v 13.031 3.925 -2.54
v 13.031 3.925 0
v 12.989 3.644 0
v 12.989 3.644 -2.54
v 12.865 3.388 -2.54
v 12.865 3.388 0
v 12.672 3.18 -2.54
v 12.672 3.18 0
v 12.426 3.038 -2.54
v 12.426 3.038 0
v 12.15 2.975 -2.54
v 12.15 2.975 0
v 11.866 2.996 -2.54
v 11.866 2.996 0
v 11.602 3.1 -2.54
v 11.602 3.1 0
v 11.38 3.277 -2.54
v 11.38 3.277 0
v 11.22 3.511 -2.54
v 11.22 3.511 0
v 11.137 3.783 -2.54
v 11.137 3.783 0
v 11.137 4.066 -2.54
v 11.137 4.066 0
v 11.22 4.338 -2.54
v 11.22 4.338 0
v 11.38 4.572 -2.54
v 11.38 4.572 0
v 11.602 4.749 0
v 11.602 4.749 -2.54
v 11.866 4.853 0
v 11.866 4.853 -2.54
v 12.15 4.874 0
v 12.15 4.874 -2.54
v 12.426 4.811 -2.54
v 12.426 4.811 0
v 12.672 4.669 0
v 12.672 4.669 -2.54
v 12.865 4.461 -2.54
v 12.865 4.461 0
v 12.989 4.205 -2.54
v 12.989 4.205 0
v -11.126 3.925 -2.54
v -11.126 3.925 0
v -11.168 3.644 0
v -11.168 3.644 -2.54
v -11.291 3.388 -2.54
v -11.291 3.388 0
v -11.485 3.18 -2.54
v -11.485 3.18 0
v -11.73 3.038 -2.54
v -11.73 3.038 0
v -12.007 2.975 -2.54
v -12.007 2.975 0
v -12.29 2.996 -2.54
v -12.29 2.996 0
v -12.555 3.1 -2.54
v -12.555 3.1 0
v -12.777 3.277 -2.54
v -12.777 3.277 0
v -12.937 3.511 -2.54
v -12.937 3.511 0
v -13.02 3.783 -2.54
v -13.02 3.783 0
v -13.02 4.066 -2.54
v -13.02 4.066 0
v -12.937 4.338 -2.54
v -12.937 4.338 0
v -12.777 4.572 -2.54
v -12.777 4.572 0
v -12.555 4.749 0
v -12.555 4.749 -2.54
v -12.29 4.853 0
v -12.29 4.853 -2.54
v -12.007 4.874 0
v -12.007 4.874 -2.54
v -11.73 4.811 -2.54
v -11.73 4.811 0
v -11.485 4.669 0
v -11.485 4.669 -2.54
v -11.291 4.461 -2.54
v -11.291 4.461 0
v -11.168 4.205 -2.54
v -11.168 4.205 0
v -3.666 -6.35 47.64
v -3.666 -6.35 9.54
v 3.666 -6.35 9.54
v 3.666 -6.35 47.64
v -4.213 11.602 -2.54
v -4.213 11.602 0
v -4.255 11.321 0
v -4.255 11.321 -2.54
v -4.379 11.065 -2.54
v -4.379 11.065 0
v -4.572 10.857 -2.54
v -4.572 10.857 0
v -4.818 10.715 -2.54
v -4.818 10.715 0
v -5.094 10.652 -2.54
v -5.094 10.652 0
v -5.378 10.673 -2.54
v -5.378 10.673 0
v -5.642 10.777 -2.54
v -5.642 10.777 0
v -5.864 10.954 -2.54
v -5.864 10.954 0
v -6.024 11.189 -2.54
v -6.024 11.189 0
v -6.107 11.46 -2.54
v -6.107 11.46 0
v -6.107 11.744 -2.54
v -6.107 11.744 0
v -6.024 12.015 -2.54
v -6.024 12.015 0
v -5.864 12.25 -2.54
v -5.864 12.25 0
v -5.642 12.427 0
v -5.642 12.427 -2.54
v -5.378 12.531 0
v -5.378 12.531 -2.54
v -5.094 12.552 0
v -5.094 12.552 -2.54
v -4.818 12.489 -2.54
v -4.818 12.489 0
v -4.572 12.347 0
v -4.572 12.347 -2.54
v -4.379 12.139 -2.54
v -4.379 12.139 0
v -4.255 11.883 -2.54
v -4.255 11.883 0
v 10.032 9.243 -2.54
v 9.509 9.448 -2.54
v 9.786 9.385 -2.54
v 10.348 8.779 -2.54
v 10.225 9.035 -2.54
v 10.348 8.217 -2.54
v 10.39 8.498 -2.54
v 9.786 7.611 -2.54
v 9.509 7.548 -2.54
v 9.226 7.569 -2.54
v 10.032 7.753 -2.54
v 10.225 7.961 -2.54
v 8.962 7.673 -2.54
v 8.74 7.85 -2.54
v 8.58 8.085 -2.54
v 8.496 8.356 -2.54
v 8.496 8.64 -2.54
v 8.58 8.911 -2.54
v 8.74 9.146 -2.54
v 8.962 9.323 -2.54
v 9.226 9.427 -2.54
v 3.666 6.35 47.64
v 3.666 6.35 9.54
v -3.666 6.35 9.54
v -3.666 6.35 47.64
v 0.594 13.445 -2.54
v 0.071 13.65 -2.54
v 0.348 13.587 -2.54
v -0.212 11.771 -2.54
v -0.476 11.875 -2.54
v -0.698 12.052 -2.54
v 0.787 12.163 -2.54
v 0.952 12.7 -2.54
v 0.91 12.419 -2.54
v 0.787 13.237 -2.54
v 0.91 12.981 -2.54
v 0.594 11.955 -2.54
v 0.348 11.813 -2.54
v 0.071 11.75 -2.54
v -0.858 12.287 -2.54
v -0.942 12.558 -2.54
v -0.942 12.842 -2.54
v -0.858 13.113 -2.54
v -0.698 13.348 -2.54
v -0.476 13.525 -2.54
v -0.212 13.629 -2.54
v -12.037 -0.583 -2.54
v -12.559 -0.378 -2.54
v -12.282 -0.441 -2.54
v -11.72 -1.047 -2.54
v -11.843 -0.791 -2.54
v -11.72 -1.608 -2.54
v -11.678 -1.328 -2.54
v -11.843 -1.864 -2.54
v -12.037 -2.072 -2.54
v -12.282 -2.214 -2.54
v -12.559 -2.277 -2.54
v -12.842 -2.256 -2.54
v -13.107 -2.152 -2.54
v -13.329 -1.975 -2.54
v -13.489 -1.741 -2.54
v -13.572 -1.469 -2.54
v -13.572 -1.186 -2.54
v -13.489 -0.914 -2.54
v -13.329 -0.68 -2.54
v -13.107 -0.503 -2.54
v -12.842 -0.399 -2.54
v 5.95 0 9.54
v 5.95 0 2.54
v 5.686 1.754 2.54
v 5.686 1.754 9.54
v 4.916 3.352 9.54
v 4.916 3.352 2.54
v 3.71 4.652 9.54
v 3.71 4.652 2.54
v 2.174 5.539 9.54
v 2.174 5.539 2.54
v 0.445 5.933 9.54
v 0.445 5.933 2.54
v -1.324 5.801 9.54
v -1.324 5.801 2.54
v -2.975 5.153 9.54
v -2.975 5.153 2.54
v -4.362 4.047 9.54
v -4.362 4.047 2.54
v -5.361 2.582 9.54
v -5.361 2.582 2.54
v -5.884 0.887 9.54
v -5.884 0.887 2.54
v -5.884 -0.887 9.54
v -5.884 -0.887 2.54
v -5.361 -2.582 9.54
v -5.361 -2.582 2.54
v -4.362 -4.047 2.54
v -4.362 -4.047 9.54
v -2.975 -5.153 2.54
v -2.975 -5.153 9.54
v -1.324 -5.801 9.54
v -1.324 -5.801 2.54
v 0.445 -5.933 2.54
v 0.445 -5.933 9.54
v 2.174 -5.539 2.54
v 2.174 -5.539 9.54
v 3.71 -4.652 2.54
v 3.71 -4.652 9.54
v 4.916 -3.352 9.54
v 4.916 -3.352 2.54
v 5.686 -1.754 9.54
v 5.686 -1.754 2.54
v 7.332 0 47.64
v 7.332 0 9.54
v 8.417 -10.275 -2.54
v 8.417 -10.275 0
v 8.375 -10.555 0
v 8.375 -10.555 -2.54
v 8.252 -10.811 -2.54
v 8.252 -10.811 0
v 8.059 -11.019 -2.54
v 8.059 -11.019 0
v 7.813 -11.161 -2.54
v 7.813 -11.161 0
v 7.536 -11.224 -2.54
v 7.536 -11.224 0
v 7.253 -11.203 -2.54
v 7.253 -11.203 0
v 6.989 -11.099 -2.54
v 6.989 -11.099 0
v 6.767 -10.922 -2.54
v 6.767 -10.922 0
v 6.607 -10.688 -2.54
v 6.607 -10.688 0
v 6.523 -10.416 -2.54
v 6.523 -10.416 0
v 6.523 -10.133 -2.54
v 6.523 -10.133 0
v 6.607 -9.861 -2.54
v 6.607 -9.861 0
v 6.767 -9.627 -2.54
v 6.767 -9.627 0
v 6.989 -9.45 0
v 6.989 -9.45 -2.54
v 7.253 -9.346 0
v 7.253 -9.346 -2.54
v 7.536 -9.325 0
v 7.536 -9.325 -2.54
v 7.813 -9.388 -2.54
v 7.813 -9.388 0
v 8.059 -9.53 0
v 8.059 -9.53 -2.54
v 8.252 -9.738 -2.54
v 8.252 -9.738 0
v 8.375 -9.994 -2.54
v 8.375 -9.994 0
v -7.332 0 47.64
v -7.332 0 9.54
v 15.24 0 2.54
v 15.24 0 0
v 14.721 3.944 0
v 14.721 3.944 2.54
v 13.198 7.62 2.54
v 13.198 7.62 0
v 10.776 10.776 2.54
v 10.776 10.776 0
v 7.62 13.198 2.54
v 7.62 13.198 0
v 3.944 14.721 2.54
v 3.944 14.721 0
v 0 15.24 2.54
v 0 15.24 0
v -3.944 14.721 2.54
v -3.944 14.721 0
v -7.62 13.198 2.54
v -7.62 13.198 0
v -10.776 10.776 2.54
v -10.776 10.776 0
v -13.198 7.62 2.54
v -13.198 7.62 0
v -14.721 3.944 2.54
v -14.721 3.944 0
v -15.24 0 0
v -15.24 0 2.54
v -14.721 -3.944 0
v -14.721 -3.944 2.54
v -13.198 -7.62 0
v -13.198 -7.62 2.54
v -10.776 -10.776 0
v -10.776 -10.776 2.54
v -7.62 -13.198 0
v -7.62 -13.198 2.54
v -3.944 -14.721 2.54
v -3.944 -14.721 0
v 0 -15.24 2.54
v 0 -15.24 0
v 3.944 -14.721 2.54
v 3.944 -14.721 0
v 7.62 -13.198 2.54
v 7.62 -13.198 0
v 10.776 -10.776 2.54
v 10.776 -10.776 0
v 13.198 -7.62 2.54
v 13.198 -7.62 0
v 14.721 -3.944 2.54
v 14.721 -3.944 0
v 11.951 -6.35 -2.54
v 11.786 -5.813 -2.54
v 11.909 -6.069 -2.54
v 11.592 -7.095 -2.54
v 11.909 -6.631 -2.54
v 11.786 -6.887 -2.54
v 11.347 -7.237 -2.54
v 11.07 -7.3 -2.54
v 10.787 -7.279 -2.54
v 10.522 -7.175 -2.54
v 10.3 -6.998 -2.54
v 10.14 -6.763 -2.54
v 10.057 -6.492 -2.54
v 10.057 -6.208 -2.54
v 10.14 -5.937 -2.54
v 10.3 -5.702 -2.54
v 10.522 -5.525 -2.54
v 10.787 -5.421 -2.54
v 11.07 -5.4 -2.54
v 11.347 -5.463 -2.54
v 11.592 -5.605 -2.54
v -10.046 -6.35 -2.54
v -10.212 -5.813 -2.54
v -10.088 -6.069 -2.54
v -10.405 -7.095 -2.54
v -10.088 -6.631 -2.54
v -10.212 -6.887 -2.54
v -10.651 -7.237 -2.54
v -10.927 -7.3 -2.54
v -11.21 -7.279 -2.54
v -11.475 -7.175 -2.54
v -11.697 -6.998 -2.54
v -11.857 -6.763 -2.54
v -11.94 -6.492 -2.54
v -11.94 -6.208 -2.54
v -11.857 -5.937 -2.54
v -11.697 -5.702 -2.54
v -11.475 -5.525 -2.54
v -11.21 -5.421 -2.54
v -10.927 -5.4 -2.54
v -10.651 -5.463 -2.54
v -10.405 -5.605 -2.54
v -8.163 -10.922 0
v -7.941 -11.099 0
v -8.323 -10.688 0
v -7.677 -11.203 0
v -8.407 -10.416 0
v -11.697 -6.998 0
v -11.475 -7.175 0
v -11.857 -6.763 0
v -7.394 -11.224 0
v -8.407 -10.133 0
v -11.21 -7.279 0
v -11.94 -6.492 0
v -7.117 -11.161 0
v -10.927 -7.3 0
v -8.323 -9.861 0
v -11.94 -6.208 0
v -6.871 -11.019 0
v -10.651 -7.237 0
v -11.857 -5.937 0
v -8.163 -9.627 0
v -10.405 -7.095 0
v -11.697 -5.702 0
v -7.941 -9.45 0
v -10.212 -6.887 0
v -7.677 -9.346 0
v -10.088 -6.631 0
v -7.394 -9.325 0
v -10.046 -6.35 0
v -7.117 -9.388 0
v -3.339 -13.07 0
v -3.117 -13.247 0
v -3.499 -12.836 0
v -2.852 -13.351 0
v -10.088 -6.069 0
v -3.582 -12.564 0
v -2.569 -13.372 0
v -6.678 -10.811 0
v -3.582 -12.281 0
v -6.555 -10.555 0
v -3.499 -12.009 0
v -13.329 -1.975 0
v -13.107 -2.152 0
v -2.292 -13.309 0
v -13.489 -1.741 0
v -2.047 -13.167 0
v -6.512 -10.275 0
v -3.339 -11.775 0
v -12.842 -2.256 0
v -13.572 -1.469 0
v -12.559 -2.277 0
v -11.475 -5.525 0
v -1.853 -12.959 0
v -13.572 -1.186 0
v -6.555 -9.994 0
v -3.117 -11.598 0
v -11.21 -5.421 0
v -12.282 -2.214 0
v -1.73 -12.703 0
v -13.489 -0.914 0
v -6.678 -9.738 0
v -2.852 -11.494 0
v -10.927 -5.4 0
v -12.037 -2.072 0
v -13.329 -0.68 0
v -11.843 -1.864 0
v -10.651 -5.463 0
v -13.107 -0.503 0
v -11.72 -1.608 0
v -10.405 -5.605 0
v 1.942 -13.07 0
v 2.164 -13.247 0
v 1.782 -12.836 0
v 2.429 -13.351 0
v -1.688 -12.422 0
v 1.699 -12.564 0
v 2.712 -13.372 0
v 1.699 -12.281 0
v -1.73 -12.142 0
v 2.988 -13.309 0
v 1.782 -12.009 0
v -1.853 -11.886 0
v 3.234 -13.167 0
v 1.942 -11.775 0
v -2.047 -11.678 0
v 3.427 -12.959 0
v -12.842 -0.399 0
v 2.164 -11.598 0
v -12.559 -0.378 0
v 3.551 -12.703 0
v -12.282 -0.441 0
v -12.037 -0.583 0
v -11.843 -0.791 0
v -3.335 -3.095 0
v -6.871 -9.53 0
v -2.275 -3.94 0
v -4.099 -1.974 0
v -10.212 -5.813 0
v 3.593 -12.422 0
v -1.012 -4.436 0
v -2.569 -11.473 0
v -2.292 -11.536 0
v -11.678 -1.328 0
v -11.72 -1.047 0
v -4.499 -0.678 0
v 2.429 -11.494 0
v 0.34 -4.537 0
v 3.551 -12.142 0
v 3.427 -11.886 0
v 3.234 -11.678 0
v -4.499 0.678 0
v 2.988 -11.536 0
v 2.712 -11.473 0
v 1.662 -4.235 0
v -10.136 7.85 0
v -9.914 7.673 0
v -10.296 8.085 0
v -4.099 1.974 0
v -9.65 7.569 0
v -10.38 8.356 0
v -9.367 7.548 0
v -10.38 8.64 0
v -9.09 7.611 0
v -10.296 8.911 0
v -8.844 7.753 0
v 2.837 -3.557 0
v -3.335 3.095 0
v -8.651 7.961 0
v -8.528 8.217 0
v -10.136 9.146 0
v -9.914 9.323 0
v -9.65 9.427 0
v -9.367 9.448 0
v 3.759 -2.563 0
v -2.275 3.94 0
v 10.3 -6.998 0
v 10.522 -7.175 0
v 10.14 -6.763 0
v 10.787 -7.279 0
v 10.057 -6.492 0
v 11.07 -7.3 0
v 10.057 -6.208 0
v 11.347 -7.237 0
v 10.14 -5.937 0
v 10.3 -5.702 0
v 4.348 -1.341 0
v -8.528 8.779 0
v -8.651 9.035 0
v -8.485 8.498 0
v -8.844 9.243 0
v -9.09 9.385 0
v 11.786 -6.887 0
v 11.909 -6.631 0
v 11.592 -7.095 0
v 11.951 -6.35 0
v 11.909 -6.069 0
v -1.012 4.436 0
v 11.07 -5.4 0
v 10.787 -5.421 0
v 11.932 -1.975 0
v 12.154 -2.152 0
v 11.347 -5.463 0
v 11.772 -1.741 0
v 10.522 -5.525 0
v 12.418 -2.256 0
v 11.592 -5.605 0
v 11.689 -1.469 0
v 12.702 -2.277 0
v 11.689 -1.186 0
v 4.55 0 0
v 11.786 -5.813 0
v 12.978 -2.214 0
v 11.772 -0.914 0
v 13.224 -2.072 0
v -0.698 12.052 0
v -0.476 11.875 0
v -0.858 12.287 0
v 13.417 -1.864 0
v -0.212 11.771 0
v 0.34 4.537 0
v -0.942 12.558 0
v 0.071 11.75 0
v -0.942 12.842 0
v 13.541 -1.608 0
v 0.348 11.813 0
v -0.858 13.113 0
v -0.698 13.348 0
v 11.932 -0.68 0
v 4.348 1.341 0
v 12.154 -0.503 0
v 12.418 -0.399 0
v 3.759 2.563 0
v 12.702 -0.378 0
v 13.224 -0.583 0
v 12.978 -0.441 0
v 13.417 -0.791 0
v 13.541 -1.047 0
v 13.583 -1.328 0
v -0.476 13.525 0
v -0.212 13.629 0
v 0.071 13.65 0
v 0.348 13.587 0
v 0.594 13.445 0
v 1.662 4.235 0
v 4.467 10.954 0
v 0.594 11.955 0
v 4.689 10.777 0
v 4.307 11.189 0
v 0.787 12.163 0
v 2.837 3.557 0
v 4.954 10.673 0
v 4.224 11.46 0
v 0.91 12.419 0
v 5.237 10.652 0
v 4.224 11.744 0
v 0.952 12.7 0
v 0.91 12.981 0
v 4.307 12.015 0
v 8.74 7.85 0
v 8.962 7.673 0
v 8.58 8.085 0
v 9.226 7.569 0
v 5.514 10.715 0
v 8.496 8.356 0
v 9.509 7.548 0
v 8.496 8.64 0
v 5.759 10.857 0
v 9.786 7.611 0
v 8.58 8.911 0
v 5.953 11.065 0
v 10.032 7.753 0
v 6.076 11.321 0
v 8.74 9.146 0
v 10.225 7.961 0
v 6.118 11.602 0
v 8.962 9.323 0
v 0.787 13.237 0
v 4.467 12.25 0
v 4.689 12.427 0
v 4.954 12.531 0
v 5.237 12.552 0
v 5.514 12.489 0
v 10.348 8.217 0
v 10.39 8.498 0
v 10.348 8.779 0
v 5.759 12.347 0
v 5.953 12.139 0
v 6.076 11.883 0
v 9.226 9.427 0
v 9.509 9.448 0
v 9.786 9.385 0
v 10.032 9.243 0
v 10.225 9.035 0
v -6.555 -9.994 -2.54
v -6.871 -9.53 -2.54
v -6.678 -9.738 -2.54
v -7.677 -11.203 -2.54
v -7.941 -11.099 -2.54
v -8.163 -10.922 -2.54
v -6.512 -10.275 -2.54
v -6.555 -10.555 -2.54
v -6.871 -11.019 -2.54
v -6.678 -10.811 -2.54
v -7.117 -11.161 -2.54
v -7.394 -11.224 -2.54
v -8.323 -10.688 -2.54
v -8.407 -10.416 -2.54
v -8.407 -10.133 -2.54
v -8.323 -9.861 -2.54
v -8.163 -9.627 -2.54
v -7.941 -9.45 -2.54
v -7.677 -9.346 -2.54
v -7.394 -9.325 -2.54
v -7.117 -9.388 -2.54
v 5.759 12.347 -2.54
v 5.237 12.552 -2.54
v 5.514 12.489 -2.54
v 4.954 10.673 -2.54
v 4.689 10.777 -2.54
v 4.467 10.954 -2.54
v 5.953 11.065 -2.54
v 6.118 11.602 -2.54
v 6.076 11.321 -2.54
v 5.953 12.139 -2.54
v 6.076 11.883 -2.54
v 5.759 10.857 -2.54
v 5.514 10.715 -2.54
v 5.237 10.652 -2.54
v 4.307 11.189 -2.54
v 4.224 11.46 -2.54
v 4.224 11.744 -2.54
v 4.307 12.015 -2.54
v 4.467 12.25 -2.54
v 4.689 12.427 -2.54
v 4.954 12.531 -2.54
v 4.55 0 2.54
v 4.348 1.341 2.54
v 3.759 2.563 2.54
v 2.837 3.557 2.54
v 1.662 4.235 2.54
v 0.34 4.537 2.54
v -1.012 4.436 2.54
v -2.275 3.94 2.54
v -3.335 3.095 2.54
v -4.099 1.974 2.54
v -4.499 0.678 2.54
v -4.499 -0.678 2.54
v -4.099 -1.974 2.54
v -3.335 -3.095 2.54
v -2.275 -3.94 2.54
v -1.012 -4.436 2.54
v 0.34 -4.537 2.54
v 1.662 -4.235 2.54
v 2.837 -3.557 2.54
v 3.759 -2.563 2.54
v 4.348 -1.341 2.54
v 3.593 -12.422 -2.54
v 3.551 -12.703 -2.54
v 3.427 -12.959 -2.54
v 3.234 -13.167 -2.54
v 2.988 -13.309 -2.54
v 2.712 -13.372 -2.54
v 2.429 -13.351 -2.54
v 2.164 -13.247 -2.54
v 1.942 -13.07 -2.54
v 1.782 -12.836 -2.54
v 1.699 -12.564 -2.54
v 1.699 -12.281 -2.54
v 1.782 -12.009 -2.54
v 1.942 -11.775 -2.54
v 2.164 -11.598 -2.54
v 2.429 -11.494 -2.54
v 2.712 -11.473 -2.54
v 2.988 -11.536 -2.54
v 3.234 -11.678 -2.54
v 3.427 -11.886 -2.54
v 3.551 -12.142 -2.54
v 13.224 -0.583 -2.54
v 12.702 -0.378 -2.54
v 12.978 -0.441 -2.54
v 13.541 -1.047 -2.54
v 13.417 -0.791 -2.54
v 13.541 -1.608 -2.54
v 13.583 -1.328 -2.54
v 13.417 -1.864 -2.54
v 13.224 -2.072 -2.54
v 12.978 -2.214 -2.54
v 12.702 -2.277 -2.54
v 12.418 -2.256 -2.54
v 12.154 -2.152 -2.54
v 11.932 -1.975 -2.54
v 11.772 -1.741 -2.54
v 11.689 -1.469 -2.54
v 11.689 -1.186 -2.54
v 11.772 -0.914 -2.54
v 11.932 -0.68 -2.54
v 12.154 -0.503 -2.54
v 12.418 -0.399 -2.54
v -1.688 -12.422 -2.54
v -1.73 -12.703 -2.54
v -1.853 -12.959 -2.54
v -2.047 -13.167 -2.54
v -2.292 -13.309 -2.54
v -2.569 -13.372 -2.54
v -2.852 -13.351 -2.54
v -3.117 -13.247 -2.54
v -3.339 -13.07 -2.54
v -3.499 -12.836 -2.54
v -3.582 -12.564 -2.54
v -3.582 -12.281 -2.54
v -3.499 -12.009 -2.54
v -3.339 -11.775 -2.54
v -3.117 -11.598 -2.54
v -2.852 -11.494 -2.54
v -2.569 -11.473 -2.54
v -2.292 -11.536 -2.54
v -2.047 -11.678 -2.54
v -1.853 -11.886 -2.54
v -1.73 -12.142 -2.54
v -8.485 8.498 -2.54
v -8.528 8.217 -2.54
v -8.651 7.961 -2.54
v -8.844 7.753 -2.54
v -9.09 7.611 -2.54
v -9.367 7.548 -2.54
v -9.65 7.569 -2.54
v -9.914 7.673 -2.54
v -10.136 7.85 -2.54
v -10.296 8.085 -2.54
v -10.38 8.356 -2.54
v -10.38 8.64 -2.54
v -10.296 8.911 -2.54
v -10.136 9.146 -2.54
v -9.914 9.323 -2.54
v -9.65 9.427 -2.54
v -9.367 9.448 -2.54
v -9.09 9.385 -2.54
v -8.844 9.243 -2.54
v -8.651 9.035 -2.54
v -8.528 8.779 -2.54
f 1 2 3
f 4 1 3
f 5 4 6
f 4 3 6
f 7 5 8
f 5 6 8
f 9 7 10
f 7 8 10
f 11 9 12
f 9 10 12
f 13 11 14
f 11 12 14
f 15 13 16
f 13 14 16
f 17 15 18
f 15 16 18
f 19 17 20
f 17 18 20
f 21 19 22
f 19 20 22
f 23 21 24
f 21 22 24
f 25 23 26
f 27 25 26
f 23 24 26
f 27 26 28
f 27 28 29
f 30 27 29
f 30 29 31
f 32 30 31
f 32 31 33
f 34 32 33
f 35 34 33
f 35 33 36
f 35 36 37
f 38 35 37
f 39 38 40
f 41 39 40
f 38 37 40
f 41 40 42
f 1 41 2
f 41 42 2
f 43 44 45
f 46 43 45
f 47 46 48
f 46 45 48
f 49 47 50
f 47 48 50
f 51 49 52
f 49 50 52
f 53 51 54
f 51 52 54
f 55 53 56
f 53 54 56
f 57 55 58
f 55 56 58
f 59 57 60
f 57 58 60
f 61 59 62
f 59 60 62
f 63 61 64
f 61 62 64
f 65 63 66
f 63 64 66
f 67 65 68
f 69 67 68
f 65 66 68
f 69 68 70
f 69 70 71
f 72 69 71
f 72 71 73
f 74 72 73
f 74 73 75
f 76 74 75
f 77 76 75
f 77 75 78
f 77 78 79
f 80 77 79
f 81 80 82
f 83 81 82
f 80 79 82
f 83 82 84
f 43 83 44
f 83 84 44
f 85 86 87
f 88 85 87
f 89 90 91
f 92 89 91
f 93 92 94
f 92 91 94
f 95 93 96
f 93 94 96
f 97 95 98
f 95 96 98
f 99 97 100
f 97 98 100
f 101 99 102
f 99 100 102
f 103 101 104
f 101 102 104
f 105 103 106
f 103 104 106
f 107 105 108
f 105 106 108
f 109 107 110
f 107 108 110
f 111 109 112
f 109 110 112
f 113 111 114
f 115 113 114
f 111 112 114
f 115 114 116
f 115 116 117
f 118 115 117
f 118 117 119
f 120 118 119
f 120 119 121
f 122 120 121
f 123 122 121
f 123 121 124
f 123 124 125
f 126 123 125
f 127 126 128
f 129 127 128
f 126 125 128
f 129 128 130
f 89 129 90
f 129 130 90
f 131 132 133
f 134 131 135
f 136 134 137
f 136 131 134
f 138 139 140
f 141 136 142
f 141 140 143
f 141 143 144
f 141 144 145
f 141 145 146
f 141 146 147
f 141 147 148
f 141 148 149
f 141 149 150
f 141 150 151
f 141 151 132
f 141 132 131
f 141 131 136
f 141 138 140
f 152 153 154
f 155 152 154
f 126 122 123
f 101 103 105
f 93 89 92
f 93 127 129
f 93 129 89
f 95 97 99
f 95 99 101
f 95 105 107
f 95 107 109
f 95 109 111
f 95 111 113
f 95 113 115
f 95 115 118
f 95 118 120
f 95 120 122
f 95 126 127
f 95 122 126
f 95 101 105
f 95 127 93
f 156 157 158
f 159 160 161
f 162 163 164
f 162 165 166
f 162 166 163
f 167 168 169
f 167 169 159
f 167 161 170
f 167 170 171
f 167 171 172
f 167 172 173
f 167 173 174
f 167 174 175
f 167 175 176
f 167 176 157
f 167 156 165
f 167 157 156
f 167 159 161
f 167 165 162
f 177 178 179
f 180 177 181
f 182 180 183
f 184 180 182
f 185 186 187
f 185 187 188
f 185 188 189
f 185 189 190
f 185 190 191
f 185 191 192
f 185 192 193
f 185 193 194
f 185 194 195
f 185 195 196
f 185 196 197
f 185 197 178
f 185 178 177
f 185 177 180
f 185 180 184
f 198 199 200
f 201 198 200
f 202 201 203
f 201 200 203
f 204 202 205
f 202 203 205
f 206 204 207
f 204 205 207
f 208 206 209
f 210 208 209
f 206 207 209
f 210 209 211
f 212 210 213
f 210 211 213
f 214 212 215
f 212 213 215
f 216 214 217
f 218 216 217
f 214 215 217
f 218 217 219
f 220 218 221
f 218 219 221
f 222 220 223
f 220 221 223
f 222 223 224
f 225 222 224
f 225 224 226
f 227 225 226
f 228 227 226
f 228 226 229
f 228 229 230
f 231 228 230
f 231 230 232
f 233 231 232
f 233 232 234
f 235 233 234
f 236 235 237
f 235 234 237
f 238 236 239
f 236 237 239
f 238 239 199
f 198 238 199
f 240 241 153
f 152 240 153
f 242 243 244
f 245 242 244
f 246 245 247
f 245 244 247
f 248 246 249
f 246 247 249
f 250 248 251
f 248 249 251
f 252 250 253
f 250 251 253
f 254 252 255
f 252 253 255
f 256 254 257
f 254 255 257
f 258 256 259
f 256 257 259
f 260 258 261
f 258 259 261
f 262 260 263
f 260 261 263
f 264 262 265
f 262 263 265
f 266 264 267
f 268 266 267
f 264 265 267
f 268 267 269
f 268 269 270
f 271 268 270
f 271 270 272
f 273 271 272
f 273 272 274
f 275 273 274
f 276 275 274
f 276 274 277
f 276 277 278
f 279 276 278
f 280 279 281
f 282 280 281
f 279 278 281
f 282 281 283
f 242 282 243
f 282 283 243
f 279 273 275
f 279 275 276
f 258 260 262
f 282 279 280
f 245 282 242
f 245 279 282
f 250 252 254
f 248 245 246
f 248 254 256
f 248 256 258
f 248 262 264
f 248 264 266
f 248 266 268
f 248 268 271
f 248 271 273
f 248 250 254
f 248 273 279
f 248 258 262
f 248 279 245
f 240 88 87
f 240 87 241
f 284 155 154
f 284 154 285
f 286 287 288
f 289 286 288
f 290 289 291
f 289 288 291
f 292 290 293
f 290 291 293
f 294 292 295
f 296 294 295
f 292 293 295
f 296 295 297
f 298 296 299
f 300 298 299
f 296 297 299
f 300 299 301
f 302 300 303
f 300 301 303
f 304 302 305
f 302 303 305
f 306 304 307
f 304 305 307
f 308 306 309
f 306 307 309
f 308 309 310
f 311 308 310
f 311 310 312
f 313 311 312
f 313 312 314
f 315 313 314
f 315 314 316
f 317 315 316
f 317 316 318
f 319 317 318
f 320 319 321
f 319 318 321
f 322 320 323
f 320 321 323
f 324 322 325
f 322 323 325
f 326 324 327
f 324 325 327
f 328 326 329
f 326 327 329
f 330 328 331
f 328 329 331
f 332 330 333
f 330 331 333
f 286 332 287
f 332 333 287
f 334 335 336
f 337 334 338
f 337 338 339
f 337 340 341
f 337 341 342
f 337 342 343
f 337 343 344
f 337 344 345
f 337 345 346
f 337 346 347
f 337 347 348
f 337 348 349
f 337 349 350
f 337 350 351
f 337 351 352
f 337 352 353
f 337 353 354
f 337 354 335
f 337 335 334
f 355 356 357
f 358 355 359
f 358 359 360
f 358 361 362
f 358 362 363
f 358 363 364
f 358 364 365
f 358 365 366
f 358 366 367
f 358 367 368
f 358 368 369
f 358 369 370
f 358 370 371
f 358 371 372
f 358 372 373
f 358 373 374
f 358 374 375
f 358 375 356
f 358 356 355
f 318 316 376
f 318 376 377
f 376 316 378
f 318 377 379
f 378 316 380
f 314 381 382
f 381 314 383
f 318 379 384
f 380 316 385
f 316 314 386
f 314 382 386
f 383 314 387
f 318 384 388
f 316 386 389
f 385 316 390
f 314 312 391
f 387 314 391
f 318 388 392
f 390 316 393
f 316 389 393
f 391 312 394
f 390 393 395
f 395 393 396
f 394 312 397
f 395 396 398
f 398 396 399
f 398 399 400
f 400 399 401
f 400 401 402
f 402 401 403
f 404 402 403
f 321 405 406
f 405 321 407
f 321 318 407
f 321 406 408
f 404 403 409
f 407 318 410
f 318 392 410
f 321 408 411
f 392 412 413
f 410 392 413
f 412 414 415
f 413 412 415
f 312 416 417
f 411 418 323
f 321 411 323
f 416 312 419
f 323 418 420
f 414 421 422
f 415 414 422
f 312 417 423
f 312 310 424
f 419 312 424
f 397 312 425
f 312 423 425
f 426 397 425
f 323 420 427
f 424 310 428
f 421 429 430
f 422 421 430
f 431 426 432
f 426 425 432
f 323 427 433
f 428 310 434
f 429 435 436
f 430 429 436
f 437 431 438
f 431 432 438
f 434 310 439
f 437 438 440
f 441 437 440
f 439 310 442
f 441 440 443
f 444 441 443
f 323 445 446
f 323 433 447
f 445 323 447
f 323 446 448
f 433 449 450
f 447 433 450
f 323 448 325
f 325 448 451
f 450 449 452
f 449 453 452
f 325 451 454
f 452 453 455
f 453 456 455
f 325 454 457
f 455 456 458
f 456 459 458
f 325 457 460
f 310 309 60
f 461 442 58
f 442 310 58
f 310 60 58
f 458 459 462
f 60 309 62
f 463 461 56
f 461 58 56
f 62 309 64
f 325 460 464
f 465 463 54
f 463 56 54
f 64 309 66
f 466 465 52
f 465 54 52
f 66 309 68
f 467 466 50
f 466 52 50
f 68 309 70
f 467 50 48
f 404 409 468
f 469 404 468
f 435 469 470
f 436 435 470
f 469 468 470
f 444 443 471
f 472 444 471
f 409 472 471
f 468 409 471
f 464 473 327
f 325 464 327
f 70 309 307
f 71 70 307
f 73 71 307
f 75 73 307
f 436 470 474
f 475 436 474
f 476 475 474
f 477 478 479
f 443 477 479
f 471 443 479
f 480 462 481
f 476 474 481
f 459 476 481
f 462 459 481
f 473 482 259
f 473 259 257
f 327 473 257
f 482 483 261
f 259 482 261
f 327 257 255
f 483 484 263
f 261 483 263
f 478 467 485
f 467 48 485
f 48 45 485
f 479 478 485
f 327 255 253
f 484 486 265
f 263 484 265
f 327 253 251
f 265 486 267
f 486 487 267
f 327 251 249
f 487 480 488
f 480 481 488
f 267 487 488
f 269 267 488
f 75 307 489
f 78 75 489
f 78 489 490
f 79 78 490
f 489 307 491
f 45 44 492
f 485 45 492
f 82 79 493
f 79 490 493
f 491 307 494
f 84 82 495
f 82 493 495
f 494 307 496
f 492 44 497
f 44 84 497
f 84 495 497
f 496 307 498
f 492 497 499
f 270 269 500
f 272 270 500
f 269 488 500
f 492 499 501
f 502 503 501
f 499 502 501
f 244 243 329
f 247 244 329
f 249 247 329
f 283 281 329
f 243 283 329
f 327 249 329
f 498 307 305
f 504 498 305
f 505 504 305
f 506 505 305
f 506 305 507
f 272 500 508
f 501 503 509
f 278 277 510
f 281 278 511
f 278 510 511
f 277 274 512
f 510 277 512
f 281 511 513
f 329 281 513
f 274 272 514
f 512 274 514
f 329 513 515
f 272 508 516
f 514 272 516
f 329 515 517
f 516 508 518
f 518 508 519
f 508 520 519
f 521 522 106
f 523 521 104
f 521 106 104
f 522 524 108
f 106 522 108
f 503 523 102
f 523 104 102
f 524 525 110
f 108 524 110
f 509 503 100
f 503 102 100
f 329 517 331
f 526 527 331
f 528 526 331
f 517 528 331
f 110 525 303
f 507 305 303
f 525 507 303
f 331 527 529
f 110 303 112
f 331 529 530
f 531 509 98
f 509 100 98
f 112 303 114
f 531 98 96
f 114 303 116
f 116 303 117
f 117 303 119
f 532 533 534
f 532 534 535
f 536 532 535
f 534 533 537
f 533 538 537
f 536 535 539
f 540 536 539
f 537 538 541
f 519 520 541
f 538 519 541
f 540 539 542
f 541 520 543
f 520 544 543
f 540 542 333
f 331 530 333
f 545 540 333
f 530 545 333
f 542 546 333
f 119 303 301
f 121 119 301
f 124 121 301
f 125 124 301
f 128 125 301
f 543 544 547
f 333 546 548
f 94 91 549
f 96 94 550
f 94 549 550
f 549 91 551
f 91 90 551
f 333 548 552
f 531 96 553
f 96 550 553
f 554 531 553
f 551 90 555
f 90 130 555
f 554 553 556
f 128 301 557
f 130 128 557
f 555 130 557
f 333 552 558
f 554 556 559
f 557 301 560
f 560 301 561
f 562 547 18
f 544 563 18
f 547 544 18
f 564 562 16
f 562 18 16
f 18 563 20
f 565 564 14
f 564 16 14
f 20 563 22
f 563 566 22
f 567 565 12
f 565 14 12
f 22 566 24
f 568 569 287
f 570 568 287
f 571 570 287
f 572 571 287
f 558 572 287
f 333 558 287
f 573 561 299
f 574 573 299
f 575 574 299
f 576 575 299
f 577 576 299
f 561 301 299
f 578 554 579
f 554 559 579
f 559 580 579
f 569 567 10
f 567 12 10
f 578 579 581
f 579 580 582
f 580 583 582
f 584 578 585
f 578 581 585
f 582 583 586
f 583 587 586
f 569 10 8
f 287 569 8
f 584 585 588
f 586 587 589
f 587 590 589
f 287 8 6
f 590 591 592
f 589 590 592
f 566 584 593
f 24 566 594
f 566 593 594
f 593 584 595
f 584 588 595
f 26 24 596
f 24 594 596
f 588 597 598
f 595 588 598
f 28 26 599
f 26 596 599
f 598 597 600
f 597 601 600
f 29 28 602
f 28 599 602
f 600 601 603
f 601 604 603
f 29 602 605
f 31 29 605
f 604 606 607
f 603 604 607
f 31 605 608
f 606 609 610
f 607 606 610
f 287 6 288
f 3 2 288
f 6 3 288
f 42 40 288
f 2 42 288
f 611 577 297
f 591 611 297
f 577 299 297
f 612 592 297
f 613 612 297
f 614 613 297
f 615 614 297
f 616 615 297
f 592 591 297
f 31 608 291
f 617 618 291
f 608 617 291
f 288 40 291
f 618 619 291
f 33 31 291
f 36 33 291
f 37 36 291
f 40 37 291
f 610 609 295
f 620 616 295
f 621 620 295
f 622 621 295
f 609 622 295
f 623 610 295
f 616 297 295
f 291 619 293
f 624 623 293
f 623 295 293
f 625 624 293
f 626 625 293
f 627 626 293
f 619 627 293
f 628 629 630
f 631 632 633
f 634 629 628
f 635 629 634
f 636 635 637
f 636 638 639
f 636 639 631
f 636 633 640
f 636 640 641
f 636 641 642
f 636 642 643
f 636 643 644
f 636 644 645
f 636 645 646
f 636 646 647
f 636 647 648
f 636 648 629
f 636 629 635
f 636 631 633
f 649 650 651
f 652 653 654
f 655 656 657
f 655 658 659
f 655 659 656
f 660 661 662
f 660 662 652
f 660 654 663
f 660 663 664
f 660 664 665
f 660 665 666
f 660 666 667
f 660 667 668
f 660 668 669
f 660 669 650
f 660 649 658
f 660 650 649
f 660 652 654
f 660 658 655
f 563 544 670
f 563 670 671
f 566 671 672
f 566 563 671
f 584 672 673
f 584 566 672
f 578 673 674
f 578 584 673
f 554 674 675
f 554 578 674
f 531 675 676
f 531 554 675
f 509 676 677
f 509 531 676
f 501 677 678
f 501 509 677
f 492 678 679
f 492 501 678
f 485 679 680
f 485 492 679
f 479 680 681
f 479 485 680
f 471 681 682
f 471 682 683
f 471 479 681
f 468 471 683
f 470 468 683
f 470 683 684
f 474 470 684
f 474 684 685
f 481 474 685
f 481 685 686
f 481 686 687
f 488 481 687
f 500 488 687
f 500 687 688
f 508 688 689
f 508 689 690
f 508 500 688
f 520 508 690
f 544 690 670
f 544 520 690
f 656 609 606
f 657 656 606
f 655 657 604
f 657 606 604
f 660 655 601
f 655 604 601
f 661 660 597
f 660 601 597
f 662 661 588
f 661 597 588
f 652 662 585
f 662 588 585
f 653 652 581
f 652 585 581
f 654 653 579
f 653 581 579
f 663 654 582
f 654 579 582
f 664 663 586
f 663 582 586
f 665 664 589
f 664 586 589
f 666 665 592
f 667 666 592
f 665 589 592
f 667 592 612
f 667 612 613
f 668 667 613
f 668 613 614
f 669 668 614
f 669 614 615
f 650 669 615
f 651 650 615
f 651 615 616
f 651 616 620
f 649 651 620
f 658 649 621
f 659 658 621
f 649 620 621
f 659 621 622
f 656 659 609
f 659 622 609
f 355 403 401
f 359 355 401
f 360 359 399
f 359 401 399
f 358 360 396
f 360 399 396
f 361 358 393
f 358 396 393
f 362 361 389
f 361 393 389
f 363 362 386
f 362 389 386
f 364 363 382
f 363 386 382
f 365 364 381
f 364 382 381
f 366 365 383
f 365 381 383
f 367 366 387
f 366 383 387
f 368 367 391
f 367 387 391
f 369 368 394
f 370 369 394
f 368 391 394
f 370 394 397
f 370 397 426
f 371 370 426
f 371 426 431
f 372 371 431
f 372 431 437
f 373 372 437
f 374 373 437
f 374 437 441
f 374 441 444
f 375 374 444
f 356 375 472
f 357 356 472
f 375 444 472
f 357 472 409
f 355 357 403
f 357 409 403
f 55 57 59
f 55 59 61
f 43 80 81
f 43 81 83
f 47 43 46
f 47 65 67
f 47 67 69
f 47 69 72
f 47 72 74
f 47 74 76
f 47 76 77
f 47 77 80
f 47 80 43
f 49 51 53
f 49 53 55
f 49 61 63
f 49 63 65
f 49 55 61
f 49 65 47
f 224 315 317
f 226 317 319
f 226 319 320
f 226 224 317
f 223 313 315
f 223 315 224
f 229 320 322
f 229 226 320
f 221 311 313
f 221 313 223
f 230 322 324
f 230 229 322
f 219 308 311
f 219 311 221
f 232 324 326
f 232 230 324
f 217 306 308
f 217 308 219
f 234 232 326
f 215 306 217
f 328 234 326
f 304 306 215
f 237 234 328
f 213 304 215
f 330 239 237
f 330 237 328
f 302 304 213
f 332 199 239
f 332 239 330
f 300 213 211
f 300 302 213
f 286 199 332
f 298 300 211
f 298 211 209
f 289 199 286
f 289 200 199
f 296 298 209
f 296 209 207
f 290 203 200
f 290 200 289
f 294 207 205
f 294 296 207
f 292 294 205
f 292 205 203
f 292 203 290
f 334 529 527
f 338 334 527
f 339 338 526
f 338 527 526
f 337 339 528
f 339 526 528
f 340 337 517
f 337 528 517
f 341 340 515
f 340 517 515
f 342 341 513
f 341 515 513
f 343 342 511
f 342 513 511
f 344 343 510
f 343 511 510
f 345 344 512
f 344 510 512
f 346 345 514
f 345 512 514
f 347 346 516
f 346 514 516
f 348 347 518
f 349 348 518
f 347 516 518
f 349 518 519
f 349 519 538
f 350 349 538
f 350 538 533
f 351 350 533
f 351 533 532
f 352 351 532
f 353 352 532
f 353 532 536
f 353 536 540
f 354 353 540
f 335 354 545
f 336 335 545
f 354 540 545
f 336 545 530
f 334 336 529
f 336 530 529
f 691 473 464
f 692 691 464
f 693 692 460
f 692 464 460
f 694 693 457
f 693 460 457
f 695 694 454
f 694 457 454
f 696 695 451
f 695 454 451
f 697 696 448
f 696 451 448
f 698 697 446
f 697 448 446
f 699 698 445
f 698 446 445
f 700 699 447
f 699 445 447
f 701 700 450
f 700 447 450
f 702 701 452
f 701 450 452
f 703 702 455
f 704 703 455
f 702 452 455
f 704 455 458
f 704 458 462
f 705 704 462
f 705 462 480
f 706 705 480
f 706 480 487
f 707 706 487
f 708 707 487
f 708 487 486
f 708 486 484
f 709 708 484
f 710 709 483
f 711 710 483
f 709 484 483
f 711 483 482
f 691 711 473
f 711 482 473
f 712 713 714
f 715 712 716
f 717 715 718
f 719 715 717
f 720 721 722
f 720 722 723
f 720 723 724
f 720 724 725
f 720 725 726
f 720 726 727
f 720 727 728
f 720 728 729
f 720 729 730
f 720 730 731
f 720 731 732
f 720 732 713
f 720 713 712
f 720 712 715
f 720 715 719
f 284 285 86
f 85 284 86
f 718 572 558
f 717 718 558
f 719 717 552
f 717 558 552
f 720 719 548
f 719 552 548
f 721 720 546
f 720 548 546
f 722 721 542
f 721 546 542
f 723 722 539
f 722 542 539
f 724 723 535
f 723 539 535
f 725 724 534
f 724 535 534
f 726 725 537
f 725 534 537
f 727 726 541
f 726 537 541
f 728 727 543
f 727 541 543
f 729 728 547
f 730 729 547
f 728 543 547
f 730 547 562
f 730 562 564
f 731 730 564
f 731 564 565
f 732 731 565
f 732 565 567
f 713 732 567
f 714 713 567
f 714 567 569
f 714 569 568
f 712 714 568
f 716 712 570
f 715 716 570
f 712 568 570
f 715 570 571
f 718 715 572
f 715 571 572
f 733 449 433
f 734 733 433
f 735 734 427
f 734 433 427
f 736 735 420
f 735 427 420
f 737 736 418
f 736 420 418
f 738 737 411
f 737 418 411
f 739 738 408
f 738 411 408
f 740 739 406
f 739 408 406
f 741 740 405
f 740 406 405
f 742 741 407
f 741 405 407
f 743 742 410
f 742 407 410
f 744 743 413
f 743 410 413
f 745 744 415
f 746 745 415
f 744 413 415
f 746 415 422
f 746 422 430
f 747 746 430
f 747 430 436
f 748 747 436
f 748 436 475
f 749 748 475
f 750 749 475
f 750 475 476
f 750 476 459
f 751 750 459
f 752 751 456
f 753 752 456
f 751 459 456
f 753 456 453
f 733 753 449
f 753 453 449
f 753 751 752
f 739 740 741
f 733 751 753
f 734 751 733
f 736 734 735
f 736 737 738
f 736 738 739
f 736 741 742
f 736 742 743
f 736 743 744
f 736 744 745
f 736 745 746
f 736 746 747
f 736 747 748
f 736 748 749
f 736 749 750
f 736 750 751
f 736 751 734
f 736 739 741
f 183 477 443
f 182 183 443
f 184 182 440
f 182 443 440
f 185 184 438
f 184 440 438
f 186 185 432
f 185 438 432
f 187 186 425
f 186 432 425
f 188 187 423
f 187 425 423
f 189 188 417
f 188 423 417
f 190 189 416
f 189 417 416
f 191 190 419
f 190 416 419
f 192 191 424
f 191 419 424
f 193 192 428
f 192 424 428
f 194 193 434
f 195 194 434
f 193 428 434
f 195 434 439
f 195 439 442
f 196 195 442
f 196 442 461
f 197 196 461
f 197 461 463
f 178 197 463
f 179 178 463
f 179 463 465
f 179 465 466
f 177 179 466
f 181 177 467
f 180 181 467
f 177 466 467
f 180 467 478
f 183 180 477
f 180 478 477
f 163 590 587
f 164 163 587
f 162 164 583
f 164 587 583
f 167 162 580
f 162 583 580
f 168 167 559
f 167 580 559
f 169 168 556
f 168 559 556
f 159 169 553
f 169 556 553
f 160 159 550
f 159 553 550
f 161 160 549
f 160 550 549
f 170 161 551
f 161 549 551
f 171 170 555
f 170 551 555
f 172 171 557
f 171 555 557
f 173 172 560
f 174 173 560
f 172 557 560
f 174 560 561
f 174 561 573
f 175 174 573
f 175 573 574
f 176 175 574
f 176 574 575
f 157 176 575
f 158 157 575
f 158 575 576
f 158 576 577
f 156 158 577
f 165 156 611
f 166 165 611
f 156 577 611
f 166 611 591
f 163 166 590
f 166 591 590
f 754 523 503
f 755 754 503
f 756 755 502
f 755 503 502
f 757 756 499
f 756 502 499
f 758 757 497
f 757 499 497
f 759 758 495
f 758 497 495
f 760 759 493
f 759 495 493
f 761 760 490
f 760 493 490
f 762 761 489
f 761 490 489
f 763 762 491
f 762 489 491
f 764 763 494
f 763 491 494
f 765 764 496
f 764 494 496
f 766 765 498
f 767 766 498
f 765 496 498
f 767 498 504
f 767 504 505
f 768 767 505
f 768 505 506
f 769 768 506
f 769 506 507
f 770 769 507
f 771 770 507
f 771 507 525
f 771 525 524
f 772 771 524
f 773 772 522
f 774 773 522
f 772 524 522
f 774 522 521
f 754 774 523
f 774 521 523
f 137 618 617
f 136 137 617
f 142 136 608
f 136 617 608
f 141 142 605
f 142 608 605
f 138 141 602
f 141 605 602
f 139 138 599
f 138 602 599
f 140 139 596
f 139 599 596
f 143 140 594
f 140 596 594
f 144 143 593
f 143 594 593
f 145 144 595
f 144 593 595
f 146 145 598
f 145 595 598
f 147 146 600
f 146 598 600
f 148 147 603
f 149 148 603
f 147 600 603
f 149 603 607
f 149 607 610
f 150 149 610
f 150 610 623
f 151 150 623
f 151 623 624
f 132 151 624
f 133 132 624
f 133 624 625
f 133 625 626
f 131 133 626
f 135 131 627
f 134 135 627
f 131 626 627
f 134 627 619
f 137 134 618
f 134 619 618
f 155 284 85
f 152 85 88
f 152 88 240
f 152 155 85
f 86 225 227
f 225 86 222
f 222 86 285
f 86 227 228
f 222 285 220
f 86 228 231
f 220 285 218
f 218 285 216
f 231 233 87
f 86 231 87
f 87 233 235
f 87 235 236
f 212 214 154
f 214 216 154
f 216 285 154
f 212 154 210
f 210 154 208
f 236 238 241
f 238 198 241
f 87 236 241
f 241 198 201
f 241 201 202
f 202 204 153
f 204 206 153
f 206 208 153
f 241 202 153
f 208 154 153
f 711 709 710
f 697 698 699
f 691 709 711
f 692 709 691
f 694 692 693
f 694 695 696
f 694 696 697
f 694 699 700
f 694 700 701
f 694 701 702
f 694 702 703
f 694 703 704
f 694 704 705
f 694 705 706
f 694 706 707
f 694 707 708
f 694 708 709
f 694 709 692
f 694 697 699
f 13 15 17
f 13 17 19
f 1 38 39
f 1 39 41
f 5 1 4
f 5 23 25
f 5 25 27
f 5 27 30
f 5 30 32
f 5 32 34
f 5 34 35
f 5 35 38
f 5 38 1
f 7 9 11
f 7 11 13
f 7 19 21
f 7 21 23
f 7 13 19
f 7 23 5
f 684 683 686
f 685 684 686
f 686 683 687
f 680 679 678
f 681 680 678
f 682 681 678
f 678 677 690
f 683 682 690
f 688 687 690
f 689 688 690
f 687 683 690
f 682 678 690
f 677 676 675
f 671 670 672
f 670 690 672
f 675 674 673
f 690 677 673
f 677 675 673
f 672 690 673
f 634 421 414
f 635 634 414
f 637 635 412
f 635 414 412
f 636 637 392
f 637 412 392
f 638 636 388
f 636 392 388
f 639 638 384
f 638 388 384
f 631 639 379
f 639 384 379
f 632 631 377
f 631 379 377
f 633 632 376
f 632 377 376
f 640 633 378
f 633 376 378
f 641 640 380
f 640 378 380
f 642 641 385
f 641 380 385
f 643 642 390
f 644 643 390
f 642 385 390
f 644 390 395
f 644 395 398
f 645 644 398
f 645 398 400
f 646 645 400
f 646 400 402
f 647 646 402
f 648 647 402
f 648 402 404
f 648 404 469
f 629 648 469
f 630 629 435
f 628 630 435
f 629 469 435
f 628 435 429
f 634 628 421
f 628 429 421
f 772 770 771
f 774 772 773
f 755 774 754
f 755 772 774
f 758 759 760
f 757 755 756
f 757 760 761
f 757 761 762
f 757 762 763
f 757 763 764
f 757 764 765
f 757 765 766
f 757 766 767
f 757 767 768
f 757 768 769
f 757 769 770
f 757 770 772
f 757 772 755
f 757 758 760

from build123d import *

# Parameters (mm, degrees)
SKETCH1_R           = 15.24
SKETCH1_R_2         = 4.55
BOSS_EXTRUDE1_DEPTH = 2.54
SKETCH2_R           = 5.95
BOSS_EXTRUDE2_DEPTH = 7
BOSS_EXTRUDE3_DEPTH = 38.1
SKETCH5_R           = 0.9525
BOSS_EXTRUDE5_DEPTH = 2.54


with BuildPart() as part:
    # Sketch1 → Boss-Extrude1 (new body)
    with BuildSketch(Plane.XY):
        Circle(SKETCH1_R)
        Circle(SKETCH1_R_2, mode=Mode.SUBTRACT)
    extrude(amount=BOSS_EXTRUDE1_DEPTH)

    # Sketch2 → Boss-Extrude2 (add)
    with BuildSketch(Plane.XY.offset(2.54)):
        Circle(SKETCH2_R)
    extrude(amount=BOSS_EXTRUDE2_DEPTH)

    # Sketch3 → Boss-Extrude3 (add)
    with BuildSketch(Plane.XY.offset(9.54)):
        Polygon((3.666174209, 6.35), (-3.666174209, 6.35), (-7.332348419, 0), (-3.666174209, -6.35), (3.666174209, -6.35), (7.332348419, 0), align=None)
    extrude(amount=BOSS_EXTRUDE3_DEPTH)

    # Sketch5 → Boss-Extrude5 (add)
    with BuildSketch(Plane(origin=(0, 0, 0), x_dir=(-1, 0, 0), z_dir=(0, 0, -1))):
        with Locations(Location((0, 12.7, 0), (0, 0, 180))):
            Circle(SKETCH5_R)
        with Locations(Location((5.165555367, 11.602027312, 0), (0, 0, 180))):
            Circle(SKETCH5_R)
        with Locations(Location((9.437939284, 8.497958701, 0), (0, 0, 180))):
            Circle(SKETCH5_R)
        with Locations(Location((12.078417757, 3.924515829, 0), (0, 0, 180))):
            Circle(SKETCH5_R)
        with Locations(Location((12.630428071, -1.327511483, 0), (0, 0, 180))):
            Circle(SKETCH5_R)
        with Locations(Location((10.998522628, -6.35, 0), (0, 0, 180))):
            Circle(SKETCH5_R)
        with Locations(Location((7.464872704, -10.274515829, 0), (0, 0, 180))):
            Circle(SKETCH5_R)
        with Locations(Location((2.640478473, -12.422474529, 0), (0, 0, 180))):
            Circle(SKETCH5_R)
        with Locations(Location((-2.640478473, -12.422474529, 0), (0, 0, 180))):
            Circle(SKETCH5_R)
        with Locations(Location((-7.464872704, -10.274515829, 0), (0, 0, 180))):
            Circle(SKETCH5_R)
        with Locations(Location((-10.998522628, -6.35, 0), (0, 0, 180))):
            Circle(SKETCH5_R)
        with Locations(Location((-12.630428071, -1.327511483, 0), (0, 0, 180))):
            Circle(SKETCH5_R)
        with Locations(Location((-12.078417757, 3.924515829, 0), (0, 0, 180))):
            Circle(SKETCH5_R)
        with Locations(Location((-9.437939284, 8.497958701, 0), (0, 0, 180))):
            Circle(SKETCH5_R)
        with Locations(Location((-5.165555367, 11.602027312, 0), (0, 0, 180))):
            Circle(SKETCH5_R)
    extrude(amount=BOSS_EXTRUDE5_DEPTH)


solid = part.part
